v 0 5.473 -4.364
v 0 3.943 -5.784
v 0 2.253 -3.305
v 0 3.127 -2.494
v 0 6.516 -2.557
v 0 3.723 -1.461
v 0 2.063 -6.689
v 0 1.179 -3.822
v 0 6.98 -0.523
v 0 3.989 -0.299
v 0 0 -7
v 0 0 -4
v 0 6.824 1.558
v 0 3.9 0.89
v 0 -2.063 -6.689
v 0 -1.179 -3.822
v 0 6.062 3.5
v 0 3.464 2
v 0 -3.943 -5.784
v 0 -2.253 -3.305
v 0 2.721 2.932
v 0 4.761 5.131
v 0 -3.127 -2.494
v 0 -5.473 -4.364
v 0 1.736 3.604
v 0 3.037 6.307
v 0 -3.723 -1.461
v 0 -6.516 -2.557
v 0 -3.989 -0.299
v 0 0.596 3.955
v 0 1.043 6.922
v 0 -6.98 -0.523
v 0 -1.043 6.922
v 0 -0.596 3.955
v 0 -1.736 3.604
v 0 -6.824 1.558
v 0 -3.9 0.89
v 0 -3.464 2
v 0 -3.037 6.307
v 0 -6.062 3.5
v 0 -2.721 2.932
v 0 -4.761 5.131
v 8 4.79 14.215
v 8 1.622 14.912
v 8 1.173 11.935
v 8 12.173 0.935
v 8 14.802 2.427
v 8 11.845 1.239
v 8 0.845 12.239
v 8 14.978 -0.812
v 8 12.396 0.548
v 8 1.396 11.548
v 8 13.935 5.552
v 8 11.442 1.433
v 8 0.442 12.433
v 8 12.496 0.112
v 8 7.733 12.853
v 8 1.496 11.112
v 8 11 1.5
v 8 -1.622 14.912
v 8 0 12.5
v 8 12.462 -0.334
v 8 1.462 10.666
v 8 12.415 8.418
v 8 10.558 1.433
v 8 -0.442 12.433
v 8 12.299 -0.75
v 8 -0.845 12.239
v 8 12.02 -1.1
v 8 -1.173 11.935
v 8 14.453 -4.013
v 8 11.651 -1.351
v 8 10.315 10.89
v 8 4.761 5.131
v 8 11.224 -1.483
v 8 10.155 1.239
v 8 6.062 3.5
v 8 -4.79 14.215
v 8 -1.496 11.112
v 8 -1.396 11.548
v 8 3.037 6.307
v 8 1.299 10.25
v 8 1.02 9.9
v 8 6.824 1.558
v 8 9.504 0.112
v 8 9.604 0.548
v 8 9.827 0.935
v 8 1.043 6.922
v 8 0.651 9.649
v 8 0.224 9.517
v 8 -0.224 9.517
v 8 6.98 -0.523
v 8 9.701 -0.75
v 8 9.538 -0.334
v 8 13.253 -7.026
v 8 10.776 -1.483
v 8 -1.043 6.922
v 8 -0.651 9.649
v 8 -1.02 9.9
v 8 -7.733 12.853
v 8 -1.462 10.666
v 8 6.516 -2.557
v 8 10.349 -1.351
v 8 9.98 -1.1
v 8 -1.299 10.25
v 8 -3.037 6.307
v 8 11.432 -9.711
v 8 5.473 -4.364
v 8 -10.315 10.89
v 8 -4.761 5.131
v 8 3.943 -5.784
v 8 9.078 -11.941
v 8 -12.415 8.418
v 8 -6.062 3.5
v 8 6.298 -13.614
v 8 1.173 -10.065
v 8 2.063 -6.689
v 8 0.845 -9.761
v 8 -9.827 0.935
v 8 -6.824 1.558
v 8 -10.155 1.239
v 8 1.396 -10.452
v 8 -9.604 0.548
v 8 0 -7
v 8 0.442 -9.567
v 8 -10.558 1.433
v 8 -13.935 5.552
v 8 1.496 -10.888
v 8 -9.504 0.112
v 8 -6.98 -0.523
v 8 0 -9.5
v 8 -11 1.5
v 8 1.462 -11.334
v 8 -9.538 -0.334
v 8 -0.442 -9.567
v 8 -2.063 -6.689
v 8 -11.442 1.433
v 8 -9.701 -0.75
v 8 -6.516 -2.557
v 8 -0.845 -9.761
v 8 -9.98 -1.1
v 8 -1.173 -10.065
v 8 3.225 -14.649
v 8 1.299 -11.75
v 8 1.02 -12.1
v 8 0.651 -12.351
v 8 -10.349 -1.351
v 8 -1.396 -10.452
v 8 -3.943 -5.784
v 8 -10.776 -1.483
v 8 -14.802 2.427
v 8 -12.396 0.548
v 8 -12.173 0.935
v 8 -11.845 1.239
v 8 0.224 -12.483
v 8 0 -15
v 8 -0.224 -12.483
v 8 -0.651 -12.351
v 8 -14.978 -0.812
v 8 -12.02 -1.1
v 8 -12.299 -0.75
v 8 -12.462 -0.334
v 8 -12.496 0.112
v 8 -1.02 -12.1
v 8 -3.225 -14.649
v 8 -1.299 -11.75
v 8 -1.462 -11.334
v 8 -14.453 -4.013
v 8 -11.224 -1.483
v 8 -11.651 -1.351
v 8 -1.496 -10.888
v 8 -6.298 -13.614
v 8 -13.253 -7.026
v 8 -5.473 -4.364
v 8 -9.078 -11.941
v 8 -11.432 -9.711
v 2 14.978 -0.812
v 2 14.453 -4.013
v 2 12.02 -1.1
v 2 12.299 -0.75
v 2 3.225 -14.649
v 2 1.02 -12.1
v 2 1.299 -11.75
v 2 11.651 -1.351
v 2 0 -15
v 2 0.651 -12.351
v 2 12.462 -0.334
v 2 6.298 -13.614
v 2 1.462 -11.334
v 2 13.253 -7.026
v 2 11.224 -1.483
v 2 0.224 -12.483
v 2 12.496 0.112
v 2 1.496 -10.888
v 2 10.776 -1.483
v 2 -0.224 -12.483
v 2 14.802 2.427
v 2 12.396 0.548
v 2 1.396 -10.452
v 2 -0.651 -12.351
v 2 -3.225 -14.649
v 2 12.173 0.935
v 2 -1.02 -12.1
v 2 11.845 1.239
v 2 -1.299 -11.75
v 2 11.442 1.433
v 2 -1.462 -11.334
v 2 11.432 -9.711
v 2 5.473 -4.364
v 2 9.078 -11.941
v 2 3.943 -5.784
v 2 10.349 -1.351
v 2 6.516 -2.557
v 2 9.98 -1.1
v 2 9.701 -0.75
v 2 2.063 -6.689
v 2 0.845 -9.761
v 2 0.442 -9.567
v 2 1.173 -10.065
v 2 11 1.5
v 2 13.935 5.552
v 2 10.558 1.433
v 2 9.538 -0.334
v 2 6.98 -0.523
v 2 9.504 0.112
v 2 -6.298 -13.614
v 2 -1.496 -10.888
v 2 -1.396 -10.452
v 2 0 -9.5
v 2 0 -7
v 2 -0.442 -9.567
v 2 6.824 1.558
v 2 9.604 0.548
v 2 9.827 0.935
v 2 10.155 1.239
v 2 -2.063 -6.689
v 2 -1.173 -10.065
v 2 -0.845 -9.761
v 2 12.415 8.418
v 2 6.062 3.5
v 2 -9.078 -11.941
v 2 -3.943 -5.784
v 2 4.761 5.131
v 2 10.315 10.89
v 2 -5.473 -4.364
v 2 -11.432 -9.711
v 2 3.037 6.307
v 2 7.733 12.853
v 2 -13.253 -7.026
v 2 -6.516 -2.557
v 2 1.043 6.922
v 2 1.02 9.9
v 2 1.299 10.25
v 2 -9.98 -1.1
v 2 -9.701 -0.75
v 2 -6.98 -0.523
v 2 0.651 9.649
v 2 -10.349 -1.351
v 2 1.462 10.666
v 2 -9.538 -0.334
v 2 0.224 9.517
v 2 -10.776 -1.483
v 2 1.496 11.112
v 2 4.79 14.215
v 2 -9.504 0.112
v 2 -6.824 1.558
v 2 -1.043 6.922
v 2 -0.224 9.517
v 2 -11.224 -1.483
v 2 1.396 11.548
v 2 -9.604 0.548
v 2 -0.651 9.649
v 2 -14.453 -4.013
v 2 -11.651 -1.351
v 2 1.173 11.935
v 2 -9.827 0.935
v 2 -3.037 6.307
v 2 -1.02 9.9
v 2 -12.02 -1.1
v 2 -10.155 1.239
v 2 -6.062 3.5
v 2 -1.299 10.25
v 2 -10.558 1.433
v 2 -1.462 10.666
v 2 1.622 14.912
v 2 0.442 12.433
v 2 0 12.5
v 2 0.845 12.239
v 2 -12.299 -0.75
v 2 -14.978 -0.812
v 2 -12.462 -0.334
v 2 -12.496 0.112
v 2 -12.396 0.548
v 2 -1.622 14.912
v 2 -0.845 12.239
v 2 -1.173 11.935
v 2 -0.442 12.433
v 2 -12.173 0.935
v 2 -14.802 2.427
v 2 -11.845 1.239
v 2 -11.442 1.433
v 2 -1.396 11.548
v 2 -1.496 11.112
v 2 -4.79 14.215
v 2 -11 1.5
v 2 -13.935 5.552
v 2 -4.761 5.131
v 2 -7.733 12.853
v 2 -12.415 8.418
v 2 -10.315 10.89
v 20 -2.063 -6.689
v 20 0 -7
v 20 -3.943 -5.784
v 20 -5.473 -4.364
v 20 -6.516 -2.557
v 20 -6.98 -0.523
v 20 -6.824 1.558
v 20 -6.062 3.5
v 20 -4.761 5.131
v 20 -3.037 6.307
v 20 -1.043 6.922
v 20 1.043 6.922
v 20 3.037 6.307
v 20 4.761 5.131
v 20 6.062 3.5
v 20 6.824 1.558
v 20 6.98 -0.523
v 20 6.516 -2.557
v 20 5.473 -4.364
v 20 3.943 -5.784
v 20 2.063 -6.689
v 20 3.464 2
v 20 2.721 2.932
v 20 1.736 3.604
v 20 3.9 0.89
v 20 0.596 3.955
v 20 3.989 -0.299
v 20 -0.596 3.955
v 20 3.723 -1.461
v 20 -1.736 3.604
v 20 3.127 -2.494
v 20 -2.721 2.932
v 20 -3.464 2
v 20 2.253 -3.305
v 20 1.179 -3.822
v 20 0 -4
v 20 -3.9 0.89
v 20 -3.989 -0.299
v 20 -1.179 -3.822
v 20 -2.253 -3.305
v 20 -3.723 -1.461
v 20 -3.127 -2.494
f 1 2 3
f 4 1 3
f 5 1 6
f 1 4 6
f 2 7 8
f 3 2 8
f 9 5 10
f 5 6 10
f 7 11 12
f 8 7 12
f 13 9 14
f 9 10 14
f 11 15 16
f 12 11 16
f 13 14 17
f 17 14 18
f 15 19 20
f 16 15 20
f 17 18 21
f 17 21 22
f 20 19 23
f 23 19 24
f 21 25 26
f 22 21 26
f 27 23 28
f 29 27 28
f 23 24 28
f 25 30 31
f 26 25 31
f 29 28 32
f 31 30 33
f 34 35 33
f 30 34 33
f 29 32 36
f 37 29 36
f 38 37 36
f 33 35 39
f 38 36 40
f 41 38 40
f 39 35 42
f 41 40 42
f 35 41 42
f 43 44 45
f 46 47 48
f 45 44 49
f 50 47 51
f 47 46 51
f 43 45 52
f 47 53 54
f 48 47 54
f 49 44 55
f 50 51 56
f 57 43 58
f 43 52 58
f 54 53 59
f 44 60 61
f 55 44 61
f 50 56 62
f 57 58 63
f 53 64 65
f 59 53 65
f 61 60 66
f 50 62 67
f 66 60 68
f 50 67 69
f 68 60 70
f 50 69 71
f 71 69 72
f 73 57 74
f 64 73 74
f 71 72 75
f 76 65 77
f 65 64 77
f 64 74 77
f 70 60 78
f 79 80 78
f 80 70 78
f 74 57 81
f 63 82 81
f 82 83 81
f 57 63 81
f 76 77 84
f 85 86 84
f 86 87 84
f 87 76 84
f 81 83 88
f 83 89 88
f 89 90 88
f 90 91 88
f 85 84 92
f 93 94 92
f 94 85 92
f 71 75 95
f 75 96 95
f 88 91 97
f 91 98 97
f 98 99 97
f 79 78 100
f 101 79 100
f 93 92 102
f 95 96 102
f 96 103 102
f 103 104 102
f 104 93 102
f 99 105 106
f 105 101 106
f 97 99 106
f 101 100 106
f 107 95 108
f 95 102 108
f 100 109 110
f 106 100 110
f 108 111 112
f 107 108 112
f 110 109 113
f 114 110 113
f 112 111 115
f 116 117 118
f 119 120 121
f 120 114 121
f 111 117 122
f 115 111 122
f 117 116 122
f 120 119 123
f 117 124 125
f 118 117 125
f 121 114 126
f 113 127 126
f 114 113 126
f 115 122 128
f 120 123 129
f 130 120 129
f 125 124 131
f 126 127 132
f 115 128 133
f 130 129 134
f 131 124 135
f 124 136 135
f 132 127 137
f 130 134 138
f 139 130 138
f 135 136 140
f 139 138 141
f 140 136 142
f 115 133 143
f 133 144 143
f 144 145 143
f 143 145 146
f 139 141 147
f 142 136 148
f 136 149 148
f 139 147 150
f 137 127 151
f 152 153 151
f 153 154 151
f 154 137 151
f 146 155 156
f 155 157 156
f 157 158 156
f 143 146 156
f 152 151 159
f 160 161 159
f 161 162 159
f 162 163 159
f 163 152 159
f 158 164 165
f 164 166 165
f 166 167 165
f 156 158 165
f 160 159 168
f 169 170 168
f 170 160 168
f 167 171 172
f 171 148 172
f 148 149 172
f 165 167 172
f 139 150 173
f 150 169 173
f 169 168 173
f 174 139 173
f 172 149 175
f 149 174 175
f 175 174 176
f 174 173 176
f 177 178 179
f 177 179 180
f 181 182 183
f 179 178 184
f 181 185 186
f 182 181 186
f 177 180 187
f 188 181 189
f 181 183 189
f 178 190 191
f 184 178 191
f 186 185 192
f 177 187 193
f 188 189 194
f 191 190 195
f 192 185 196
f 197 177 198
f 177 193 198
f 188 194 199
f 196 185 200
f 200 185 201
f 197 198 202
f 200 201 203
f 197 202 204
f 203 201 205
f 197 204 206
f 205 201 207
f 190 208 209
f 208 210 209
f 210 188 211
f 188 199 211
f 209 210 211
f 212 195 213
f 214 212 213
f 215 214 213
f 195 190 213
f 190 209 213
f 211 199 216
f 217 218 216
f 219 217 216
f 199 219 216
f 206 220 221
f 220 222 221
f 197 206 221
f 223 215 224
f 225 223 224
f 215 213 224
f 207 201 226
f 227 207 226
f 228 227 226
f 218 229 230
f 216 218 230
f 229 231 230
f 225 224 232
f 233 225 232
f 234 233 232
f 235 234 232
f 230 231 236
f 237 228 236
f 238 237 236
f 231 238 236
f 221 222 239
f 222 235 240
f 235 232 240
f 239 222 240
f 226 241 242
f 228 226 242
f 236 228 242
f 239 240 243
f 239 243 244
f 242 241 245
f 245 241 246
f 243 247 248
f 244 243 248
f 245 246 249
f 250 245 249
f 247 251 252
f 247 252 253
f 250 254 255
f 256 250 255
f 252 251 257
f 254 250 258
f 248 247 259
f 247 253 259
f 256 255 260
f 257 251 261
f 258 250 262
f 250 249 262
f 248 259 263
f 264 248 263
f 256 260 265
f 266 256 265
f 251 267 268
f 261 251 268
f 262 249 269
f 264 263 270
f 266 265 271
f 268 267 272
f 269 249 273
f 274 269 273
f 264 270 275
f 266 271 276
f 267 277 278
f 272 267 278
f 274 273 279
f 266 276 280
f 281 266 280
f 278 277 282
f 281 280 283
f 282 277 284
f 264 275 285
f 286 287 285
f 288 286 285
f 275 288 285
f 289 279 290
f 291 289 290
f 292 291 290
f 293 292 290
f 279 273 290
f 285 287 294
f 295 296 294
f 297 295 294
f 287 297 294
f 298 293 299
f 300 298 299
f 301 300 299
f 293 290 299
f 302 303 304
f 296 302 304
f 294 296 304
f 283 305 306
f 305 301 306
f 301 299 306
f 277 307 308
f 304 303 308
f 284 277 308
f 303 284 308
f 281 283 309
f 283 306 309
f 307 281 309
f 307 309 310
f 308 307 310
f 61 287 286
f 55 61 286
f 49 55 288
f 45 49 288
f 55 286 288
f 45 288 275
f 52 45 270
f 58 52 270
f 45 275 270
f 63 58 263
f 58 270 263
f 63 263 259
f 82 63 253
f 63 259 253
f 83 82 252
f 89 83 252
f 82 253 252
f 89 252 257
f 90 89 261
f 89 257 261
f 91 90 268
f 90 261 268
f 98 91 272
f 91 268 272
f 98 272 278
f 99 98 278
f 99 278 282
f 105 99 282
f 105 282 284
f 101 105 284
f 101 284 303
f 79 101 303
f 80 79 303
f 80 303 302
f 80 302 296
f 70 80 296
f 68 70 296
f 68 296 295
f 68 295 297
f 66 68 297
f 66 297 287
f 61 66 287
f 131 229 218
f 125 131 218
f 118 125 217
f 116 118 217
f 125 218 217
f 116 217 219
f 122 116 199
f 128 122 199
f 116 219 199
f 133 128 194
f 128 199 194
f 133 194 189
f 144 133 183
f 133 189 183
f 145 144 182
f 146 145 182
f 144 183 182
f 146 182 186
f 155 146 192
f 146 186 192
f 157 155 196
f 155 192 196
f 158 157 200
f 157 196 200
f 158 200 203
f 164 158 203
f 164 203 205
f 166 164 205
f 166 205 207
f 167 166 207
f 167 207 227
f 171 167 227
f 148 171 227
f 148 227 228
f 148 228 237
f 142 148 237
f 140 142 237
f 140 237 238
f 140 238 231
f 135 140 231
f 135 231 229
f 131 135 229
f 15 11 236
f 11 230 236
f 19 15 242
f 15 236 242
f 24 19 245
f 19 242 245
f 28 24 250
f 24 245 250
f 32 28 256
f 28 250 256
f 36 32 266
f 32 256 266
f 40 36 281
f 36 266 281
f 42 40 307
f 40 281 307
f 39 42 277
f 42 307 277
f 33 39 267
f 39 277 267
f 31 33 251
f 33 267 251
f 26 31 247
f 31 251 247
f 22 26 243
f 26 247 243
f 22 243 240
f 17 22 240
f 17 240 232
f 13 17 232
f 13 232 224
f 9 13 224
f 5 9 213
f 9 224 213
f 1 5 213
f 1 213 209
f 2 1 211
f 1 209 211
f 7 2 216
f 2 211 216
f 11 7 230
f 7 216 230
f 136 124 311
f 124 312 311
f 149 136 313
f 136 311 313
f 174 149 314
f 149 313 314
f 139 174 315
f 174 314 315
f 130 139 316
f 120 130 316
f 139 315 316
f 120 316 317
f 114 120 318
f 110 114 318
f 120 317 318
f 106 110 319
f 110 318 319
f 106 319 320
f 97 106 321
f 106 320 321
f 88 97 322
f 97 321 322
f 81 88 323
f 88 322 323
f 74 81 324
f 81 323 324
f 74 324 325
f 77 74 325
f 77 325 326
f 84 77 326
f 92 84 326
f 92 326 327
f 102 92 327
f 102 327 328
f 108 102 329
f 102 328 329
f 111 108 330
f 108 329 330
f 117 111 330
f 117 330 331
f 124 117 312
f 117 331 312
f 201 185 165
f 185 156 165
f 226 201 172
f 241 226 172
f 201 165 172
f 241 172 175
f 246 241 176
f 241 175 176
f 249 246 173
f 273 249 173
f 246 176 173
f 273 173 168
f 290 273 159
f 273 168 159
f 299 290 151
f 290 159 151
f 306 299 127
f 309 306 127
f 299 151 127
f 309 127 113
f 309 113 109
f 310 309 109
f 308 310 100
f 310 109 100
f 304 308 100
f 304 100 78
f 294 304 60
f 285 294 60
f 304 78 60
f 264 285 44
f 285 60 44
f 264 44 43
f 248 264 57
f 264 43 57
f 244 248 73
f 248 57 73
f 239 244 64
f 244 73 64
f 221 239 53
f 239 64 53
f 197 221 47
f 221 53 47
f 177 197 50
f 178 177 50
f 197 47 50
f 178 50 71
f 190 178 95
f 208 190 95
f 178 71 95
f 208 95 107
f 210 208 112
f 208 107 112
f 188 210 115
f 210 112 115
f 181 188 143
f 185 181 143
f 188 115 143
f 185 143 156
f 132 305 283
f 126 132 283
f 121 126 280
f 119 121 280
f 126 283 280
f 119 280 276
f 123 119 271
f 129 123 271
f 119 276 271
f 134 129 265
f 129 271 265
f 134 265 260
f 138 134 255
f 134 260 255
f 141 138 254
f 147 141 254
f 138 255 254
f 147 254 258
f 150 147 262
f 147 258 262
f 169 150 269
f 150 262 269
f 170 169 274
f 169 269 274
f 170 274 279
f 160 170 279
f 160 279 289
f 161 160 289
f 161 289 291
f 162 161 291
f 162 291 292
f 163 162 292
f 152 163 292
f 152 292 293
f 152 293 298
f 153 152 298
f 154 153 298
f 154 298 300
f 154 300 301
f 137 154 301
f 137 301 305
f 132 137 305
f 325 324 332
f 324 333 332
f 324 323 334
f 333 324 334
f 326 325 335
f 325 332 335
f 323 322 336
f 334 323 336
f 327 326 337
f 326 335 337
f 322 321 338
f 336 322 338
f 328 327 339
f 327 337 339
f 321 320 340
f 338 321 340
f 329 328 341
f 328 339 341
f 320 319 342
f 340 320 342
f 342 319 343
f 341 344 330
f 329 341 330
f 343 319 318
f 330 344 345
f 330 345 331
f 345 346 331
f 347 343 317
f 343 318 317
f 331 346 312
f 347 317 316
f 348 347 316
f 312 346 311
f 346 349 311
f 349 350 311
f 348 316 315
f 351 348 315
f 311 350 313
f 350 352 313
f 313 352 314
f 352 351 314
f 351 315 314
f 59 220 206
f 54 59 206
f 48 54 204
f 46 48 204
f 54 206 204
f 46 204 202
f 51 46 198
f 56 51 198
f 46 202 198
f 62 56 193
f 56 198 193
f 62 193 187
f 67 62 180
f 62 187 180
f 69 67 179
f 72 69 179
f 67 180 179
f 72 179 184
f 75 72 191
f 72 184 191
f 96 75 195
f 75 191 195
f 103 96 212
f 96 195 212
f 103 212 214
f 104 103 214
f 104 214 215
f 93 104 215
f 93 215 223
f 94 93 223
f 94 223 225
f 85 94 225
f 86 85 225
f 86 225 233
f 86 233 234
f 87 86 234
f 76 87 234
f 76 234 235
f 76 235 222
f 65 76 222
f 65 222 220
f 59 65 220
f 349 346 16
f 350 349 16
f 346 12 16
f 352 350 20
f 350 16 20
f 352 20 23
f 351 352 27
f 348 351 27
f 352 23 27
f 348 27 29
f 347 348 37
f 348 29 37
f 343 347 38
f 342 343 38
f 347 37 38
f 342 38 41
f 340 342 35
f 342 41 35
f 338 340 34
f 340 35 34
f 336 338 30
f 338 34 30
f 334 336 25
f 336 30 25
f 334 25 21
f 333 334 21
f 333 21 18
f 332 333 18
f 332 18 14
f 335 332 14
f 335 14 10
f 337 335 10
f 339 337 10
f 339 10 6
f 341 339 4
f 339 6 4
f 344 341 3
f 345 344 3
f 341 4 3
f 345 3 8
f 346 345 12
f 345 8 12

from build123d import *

# Parameters (mm, degrees)
SKETCH_2_R          = 1.5
CUT_EXTRUDE_1_DEPTH = 28.820855486


with BuildPart() as part:
    # Эскиз1 → Повернуть1 (revolve)
    with BuildSketch(Plane.XY, mode=Mode.PRIVATE) as revolve_1_sk:
        Polygon((0, 4), (0, 7), (2, 7), (2, 15), (8, 15), (8, 7), (20, 7), (20, 4), align=None)
    revolve(revolve_1_sk.sketch.rotate(Axis((8, 0, 0), (-1, 0, 0)), 90), axis=Axis((8, 0, 0), (-1, 0, 0)))

    # Эскиз2 → Вырез-Вытянуть1 (cut, through all)
    with BuildSketch(Plane.ZY.offset(-2)):
        with Locations((0, 11)):
            Circle(SKETCH_2_R)
        with Locations((-11, 0)):
            Circle(SKETCH_2_R)
        with Locations((0, -11)):
            Circle(SKETCH_2_R)
        with Locations((11, 0)):
            Circle(SKETCH_2_R)
    extrude(amount=-CUT_EXTRUDE_1_DEPTH, mode=Mode.SUBTRACT)


solid = part.part
